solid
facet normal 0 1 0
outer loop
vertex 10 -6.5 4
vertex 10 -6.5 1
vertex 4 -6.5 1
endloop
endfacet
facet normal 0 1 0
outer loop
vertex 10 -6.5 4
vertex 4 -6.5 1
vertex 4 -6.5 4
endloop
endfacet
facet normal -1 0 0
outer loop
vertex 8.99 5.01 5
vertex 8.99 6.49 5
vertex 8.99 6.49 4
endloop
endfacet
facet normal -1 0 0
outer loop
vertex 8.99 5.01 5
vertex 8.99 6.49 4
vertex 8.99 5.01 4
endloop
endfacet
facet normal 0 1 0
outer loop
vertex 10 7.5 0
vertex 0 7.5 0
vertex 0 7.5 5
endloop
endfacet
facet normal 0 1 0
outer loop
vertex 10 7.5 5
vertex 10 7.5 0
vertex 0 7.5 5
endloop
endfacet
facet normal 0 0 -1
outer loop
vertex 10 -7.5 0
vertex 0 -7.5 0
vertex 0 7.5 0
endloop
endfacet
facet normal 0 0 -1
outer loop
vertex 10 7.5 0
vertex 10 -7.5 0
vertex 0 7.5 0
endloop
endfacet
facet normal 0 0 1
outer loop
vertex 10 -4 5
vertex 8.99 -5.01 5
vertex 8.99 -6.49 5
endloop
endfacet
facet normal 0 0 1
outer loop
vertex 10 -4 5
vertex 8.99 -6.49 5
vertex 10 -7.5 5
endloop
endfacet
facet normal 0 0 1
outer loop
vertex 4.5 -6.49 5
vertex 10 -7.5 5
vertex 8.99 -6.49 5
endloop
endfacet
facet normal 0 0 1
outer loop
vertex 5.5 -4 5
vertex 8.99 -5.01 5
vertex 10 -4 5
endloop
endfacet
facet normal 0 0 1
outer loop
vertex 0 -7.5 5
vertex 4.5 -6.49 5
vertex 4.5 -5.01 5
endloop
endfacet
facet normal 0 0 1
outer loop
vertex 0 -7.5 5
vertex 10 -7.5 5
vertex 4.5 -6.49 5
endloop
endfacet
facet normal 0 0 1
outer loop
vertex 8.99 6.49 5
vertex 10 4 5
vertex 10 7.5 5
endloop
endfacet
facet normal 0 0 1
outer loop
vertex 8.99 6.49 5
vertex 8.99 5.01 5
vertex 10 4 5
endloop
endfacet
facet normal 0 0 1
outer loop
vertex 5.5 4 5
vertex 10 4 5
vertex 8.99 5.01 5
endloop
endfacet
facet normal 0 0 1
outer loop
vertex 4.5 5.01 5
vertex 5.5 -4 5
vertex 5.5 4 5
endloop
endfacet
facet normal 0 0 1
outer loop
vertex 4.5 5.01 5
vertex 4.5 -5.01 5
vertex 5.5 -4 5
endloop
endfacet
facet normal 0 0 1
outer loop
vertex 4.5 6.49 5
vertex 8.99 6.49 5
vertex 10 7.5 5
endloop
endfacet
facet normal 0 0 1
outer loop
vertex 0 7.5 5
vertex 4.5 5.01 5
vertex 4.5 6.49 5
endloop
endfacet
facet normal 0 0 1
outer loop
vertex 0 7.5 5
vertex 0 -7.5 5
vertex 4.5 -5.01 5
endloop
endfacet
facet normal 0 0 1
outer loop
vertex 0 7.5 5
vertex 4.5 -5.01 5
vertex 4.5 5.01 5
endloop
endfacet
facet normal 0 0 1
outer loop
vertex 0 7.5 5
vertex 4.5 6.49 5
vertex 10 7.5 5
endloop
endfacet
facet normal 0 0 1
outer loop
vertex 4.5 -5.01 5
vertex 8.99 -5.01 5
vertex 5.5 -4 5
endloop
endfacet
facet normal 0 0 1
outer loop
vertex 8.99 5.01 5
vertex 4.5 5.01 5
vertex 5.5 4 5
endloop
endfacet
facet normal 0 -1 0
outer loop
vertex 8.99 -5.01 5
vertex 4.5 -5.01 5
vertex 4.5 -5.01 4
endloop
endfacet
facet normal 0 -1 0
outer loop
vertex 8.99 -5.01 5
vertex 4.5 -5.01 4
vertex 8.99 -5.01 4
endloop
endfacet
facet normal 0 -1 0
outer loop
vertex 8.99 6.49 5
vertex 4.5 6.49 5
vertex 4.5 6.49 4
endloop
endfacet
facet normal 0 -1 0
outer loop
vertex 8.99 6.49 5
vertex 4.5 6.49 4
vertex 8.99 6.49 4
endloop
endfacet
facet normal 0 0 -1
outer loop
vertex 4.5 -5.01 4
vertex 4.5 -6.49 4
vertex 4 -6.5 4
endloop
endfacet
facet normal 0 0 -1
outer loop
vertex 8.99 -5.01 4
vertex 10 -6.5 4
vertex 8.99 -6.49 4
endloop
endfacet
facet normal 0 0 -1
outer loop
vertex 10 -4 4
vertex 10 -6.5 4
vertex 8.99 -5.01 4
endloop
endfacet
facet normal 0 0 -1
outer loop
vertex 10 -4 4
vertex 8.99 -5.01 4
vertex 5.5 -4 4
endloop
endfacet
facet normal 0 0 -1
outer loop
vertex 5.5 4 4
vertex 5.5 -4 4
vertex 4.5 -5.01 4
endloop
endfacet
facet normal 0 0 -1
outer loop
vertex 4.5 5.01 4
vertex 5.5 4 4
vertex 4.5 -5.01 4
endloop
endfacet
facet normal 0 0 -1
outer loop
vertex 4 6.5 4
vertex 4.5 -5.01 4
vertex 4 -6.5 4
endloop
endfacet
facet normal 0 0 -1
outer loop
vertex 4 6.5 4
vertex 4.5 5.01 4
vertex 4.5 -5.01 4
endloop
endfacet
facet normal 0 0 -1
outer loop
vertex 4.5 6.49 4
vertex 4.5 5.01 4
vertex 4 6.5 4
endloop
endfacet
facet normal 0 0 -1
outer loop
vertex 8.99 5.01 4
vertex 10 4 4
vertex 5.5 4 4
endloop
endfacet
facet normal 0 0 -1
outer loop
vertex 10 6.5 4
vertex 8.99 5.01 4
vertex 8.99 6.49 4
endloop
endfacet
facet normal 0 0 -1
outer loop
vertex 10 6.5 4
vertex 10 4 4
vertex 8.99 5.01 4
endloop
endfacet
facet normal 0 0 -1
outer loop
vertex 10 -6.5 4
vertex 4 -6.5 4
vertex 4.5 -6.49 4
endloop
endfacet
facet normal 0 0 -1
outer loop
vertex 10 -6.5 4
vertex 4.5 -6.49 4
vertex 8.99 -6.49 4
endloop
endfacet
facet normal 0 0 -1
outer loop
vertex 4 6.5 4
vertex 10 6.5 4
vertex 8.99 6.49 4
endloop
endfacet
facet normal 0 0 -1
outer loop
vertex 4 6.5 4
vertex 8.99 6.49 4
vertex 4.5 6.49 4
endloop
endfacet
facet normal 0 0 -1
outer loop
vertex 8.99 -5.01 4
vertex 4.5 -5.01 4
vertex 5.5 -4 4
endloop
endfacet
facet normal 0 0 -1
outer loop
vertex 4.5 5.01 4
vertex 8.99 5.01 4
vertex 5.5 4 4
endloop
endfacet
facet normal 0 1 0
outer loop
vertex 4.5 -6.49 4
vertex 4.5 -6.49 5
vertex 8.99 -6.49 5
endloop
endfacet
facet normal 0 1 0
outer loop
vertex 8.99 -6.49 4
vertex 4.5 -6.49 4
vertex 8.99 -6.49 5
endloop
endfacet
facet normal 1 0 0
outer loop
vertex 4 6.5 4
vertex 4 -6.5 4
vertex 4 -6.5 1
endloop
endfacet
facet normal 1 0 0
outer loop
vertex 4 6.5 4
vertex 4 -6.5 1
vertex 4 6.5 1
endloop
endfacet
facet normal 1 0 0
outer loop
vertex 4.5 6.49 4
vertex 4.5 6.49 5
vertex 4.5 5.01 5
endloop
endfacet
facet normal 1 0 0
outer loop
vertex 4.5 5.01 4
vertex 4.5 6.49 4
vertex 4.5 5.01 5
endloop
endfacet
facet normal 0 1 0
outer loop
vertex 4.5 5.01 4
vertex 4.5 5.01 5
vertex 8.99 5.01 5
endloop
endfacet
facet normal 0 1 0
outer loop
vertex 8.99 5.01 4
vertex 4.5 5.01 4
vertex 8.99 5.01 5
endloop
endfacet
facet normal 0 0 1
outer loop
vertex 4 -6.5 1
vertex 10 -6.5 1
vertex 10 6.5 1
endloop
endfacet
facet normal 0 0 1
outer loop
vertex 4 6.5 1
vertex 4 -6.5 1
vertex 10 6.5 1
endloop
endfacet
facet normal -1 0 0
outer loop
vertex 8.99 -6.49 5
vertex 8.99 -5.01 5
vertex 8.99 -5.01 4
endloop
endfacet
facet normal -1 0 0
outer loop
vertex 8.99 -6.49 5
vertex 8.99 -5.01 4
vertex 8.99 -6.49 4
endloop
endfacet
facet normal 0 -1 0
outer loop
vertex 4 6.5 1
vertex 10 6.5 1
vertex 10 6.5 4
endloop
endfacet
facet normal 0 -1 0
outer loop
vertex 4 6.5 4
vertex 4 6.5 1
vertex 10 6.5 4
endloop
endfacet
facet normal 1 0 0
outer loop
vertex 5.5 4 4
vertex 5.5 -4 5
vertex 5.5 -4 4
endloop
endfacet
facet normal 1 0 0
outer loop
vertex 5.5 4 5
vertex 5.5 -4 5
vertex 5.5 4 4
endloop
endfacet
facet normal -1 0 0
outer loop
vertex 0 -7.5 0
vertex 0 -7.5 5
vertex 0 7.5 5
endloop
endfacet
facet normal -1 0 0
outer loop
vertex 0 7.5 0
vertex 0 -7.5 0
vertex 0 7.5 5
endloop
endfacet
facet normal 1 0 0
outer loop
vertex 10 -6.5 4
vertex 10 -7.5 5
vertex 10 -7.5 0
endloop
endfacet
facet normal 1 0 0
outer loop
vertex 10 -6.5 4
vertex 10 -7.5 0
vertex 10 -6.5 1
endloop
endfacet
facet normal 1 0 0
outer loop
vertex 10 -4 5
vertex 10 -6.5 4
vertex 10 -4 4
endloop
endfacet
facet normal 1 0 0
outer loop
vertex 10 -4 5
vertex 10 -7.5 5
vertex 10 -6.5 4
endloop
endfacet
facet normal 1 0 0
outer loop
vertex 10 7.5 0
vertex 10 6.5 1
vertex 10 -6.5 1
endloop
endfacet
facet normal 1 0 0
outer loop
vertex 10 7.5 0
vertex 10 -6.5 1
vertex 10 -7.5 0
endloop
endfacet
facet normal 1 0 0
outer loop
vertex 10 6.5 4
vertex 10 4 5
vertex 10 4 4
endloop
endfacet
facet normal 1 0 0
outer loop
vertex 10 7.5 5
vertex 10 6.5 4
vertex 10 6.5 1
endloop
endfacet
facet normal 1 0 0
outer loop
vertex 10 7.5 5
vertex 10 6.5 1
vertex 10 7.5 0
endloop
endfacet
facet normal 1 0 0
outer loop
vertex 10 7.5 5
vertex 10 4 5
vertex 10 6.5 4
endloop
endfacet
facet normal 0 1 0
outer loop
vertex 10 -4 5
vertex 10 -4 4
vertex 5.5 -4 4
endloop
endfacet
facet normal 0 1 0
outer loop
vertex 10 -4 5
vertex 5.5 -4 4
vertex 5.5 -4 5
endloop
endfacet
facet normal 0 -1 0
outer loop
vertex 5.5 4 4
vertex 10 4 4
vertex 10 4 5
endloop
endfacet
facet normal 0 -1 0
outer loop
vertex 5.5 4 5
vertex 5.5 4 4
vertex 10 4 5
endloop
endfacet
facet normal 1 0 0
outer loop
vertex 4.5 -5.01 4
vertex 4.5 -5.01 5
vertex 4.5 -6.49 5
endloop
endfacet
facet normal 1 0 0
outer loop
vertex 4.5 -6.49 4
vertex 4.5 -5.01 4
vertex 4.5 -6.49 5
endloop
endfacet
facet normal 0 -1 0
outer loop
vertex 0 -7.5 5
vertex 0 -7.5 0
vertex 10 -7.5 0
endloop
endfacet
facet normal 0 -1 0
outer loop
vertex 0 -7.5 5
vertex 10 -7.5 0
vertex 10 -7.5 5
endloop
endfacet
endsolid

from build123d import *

# Parameters (mm, degrees)
SKETCH014_W     = 15
SKETCH014_H     = 5
PAD006_DEPTH    = 10
SKETCH015_W     = 13
SKETCH015_H     = 3
POCKET011_DEPTH = 6
SKETCH016_W     = 8
SKETCH016_H     = 1
POCKET012_DEPTH = 4.5
SKETCH017_W     = 1.48
SKETCH017_H     = 4.49
POCKET014_DEPTH = 2


with BuildPart() as part:
    # Sketch014 → Pad006 (new body)
    with BuildSketch(Plane.YZ):
        with Locations((0, 2.5)):
            Rectangle(SKETCH014_W, SKETCH014_H)
    extrude(amount=PAD006_DEPTH)

    # Sketch015 (on Face6 of Pad006) → Pocket011 (cut)
    with BuildSketch(Plane.YZ.offset(10)):
        with Locations((0, 2.5)):
            Rectangle(SKETCH015_W, SKETCH015_H)
    extrude(amount=-POCKET011_DEPTH, mode=Mode.SUBTRACT)

    # Sketch016 (on Face5 of Pocket011) → Pocket012 (cut)
    with BuildSketch(Plane.YZ.offset(10)):
        with Locations((0, 4.5)):
            Rectangle(SKETCH016_W, SKETCH016_H)
    extrude(amount=-POCKET012_DEPTH, mode=Mode.SUBTRACT)

    # Sketch017 (on Face6 of Pocket012) → Pocket014 (cut)
    with BuildSketch(Plane(origin=(0, 0, 5), x_dir=(0, -1, 0), z_dir=(0, 0, 1))):
        with Locations((-5.75, 6.745)):
            Rectangle(SKETCH017_W, SKETCH017_H)
        with Locations((5.75, 6.745)):
            Rectangle(SKETCH017_W, SKETCH017_H)
    extrude(amount=-POCKET014_DEPTH, mode=Mode.SUBTRACT)


solid = part.part
